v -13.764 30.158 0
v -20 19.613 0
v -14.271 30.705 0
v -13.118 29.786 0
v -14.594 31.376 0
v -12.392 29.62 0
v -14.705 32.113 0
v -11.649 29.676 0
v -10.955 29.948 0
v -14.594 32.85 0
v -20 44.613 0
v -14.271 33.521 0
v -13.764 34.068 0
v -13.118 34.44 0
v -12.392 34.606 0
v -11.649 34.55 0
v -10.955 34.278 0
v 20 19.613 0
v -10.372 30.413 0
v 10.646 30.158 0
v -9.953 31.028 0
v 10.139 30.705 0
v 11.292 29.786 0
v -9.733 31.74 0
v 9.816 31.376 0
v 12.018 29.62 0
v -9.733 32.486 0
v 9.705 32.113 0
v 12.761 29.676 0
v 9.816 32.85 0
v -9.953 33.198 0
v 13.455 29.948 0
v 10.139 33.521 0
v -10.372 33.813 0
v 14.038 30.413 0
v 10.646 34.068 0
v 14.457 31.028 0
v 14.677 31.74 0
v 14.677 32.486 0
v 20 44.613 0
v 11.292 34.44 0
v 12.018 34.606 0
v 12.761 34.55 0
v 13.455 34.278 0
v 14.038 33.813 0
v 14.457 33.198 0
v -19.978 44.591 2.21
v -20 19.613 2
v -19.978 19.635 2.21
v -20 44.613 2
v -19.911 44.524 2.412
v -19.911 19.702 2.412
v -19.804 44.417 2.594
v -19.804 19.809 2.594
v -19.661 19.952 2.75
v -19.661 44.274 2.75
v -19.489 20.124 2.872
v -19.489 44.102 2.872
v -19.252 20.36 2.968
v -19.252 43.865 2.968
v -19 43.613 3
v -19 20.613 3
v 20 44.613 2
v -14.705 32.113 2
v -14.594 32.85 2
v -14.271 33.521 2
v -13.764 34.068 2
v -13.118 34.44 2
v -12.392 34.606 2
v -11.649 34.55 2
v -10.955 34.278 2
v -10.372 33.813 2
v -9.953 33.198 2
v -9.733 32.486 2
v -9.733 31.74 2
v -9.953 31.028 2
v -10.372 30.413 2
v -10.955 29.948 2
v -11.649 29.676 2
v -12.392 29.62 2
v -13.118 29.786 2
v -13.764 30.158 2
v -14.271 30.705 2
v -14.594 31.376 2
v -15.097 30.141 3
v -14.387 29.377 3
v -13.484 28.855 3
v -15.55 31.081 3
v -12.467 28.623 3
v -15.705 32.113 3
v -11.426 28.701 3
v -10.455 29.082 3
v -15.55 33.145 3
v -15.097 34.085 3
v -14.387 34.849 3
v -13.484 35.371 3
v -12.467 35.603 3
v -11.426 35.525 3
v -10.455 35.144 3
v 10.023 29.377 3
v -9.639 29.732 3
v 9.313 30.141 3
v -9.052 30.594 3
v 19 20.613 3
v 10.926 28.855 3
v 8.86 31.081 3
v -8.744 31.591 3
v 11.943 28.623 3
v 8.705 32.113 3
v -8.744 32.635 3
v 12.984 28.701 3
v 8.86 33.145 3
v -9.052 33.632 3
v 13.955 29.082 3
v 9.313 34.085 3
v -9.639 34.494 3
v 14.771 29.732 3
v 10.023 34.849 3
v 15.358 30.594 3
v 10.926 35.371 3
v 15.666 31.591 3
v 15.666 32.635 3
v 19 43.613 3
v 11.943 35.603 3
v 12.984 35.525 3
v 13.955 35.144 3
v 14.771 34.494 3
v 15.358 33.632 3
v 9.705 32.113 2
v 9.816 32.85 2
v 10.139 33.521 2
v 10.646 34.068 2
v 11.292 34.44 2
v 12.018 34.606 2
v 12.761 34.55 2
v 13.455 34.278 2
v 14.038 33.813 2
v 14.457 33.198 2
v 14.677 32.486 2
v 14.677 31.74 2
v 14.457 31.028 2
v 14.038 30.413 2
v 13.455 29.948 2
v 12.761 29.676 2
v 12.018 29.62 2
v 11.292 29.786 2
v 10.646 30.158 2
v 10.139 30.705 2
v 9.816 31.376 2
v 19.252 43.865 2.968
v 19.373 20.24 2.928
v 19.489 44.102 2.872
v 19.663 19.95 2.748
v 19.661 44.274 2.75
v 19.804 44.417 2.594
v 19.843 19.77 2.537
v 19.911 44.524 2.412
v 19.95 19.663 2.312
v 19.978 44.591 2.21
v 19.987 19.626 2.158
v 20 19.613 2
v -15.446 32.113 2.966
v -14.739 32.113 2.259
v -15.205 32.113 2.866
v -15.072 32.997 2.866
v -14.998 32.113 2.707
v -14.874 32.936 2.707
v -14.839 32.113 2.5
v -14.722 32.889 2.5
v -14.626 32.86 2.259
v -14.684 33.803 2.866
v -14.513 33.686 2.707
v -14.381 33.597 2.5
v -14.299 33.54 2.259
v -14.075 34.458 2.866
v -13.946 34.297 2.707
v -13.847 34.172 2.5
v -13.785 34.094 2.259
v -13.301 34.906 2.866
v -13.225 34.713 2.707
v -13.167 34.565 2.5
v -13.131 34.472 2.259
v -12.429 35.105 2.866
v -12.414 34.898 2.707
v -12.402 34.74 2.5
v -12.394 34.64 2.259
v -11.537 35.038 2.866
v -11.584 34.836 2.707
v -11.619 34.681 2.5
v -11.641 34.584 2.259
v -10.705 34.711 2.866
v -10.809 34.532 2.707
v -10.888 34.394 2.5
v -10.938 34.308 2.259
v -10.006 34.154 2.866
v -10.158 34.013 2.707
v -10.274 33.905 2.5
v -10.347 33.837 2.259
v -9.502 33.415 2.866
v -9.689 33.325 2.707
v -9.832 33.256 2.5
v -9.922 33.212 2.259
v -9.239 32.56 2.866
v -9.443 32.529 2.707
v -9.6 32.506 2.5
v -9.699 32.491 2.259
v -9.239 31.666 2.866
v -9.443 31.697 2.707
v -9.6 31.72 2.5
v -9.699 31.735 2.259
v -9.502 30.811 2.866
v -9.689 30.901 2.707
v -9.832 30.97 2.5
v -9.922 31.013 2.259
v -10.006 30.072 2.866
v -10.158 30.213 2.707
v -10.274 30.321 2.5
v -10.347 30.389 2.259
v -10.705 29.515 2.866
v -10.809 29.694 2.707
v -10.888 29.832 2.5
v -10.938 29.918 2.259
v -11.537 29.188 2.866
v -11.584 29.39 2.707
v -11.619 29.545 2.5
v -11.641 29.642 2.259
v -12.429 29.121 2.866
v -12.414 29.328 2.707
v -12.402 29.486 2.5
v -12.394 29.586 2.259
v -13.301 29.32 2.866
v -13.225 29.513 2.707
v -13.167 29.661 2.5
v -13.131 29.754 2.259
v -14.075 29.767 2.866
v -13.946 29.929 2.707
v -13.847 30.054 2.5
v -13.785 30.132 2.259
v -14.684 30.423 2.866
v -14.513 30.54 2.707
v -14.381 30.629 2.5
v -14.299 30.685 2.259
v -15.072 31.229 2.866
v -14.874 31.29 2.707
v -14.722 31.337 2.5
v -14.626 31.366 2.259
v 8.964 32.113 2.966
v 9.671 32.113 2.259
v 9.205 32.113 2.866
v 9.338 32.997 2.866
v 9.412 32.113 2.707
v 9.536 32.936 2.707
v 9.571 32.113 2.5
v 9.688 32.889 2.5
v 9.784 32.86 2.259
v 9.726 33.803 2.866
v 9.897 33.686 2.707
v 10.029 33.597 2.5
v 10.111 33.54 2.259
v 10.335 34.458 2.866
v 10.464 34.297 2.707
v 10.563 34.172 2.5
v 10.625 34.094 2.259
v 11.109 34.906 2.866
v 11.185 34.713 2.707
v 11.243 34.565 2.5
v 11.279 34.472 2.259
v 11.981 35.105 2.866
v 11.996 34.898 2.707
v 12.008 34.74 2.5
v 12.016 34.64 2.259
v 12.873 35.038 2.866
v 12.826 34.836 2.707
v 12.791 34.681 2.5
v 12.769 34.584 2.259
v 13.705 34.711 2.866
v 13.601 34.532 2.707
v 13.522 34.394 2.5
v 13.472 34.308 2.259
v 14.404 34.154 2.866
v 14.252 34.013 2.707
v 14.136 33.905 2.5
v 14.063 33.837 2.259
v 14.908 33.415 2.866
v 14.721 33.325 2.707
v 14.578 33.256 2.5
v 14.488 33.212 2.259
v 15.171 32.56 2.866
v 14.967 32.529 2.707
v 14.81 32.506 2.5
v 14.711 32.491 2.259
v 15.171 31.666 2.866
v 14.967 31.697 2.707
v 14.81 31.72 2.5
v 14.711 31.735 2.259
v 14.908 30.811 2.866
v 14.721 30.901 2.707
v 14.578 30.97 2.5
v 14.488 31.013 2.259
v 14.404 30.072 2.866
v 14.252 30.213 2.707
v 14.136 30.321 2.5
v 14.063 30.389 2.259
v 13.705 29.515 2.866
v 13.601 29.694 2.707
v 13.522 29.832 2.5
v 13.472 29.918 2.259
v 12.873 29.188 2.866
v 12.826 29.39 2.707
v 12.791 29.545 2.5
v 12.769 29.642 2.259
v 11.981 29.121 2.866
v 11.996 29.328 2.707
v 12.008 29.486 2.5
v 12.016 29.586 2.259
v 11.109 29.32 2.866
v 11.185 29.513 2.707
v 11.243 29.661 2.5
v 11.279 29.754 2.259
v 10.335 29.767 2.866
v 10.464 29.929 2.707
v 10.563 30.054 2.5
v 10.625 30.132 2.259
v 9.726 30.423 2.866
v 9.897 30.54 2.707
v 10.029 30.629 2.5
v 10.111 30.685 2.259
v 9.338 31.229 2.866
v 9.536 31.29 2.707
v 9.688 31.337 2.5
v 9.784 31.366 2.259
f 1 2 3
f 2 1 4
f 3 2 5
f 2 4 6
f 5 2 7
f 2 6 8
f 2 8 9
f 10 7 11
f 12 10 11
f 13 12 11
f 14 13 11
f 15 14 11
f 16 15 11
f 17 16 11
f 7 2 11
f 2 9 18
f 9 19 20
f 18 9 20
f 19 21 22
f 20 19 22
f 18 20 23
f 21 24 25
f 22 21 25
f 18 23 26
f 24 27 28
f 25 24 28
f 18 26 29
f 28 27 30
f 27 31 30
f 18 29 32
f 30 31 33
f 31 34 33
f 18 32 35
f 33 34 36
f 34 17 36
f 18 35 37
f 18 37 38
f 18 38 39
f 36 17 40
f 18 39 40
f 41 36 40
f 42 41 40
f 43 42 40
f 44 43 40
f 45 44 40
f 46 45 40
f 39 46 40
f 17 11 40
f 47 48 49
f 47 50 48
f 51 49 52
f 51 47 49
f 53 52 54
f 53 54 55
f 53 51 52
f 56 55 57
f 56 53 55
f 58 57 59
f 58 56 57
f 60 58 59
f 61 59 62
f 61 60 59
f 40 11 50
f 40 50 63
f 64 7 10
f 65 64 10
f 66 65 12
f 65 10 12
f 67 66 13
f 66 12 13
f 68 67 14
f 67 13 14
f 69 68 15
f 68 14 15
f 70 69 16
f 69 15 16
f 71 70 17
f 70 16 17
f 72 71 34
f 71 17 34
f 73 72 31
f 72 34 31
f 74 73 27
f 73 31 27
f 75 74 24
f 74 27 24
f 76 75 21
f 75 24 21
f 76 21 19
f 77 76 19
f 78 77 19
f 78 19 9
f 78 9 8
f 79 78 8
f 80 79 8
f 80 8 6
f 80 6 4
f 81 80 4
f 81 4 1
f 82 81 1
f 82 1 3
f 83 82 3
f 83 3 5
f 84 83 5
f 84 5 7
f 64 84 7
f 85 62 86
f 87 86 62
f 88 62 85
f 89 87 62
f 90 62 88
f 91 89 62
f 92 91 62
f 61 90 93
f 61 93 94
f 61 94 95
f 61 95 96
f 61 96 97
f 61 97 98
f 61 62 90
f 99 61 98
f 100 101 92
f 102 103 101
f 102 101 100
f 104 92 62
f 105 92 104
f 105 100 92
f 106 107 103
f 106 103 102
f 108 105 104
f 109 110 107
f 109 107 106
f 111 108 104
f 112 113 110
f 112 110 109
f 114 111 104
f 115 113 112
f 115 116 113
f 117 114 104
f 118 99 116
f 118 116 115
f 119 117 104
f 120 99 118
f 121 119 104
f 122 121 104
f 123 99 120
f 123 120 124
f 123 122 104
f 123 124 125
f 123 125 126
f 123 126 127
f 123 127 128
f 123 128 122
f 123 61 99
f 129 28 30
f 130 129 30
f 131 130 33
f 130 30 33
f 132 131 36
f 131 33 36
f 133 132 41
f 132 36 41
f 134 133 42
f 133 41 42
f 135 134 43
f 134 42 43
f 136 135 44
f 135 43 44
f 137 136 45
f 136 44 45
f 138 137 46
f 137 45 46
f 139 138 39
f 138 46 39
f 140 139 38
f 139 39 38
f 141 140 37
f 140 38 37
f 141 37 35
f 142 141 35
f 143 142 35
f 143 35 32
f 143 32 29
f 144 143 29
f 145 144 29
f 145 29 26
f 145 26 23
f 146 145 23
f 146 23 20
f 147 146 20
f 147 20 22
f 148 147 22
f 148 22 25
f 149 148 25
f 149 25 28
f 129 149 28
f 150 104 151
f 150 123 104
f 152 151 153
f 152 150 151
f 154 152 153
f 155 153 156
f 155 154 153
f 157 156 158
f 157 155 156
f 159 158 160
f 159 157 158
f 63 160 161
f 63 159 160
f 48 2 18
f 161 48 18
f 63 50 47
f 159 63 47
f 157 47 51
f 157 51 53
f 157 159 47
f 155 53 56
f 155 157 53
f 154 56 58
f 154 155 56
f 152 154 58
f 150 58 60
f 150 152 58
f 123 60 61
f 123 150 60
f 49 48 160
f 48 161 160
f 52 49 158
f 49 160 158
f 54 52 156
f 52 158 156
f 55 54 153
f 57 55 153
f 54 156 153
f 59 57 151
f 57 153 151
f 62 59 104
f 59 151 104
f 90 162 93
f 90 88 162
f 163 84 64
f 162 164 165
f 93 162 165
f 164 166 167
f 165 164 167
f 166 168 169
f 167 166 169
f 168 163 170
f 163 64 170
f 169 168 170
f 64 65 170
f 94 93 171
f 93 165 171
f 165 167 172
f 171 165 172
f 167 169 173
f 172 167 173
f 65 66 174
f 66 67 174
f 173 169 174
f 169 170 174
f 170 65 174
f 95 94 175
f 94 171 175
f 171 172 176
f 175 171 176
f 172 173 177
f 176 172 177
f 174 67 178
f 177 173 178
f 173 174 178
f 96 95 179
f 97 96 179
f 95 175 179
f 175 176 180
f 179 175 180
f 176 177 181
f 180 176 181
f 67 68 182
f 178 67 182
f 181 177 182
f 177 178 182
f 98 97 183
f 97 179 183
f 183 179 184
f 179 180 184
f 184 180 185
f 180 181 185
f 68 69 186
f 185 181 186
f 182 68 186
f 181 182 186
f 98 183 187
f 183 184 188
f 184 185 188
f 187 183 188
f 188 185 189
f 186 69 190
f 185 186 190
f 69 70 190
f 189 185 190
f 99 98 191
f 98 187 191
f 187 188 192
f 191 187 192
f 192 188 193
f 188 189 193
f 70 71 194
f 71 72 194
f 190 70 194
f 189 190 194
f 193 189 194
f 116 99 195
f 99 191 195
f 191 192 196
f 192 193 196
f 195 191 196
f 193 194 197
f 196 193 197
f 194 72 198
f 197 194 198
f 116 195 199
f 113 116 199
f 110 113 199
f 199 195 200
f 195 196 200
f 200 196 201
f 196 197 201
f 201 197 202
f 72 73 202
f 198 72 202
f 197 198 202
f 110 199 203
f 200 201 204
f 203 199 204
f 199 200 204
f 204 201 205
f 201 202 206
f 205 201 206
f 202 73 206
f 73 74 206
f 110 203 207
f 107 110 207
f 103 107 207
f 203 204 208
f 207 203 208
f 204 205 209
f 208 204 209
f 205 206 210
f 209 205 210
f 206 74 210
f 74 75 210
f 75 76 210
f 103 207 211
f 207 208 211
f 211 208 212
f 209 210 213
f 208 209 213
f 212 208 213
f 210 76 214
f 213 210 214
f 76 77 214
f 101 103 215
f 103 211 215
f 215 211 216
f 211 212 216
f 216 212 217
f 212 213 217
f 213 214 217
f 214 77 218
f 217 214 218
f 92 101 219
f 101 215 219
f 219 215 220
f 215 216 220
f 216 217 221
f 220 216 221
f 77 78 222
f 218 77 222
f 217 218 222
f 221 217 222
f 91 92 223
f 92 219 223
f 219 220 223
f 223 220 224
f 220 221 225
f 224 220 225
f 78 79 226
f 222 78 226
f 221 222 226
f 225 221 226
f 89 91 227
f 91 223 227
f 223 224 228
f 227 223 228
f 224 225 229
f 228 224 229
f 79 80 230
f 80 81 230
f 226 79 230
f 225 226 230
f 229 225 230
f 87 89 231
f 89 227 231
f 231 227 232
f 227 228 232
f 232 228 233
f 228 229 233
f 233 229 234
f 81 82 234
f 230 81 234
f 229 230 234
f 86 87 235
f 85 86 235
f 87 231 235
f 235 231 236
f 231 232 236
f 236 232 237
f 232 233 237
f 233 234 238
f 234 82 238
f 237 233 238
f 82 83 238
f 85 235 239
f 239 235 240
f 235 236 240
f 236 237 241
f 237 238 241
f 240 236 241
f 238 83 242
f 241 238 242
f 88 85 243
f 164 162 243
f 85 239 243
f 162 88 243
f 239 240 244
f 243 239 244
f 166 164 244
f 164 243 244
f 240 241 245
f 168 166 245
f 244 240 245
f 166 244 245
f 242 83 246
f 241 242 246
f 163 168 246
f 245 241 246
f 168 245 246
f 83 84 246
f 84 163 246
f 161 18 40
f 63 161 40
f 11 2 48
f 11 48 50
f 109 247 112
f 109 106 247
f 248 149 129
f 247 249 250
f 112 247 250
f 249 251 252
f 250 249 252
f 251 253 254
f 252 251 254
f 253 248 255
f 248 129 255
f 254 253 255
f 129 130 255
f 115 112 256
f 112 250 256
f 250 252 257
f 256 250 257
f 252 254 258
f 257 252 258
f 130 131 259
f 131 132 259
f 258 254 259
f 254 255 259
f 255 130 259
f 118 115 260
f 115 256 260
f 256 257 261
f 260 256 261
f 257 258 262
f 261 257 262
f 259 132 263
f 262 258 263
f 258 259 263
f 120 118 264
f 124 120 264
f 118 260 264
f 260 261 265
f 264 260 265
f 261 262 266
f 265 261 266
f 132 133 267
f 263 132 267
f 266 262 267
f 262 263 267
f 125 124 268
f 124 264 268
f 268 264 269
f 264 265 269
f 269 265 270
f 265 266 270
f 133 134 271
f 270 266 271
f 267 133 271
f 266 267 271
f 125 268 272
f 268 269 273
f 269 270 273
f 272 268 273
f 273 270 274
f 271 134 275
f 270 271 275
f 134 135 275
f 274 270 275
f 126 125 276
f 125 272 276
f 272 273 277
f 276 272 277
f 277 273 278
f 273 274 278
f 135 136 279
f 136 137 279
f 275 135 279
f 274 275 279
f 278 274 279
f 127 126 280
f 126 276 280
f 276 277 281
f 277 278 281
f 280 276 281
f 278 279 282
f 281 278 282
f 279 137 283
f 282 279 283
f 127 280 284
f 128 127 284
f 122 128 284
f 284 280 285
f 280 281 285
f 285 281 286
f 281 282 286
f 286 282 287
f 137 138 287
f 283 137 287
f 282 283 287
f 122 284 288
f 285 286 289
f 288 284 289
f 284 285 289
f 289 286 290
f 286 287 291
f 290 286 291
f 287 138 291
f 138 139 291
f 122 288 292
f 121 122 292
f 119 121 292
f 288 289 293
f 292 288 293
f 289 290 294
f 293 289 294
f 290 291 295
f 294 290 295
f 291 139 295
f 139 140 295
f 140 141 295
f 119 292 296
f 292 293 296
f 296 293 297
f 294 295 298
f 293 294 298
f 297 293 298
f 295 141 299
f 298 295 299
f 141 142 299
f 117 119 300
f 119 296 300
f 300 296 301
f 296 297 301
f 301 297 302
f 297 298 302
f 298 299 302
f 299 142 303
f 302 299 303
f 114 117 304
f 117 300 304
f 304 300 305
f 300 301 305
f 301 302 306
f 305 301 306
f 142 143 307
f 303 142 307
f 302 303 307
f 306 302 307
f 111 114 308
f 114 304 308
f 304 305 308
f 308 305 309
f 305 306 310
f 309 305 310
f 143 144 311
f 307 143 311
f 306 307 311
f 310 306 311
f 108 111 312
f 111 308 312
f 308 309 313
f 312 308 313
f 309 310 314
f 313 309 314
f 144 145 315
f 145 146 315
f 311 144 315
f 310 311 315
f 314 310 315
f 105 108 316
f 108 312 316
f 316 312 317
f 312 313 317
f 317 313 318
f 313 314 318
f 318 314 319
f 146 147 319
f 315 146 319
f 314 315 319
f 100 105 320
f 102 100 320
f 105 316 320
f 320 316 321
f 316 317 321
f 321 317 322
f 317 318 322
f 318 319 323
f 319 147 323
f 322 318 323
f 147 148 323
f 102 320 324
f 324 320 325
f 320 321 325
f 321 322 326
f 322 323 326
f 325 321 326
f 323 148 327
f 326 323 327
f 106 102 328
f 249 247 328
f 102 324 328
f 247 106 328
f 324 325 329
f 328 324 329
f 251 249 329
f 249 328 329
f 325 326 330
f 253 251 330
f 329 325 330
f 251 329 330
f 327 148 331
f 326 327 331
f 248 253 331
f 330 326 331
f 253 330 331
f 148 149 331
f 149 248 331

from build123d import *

# Parameters (mm, degrees)
F0_W     = 40
F0_H     = 25
F1_DEPTH = 3
F4_D     = 5
F5_R     = 1


with BuildPart() as f1:
    # F0 (on Top) → F1 (new body)
    with BuildSketch(Plane.XY):
        with Locations((0, 32.112984)):
            Rectangle(F0_W, F0_H)
    extrude(amount=F1_DEPTH)

    # F4 (through all)
    with Locations(Plane.XY.offset(5)):
        with Locations((-12.205, 32.112984), (12.205, 32.112984)):
            Hole(F4_D / 2)

    # F5
    f5_edges = [f1.edges().sort_by_distance(p)[0] for p in [
        (0, 44.612984, 3),
        (20, 32.112984, 3),
        (-20, 32.112984, 3),
        (0, 19.612984, 3),
        (-14.705, 32.112984, 3),
        (9.705, 32.112984, 3),
    ]]
    fillet(f5_edges, radius=F5_R)


solid = f1.part
